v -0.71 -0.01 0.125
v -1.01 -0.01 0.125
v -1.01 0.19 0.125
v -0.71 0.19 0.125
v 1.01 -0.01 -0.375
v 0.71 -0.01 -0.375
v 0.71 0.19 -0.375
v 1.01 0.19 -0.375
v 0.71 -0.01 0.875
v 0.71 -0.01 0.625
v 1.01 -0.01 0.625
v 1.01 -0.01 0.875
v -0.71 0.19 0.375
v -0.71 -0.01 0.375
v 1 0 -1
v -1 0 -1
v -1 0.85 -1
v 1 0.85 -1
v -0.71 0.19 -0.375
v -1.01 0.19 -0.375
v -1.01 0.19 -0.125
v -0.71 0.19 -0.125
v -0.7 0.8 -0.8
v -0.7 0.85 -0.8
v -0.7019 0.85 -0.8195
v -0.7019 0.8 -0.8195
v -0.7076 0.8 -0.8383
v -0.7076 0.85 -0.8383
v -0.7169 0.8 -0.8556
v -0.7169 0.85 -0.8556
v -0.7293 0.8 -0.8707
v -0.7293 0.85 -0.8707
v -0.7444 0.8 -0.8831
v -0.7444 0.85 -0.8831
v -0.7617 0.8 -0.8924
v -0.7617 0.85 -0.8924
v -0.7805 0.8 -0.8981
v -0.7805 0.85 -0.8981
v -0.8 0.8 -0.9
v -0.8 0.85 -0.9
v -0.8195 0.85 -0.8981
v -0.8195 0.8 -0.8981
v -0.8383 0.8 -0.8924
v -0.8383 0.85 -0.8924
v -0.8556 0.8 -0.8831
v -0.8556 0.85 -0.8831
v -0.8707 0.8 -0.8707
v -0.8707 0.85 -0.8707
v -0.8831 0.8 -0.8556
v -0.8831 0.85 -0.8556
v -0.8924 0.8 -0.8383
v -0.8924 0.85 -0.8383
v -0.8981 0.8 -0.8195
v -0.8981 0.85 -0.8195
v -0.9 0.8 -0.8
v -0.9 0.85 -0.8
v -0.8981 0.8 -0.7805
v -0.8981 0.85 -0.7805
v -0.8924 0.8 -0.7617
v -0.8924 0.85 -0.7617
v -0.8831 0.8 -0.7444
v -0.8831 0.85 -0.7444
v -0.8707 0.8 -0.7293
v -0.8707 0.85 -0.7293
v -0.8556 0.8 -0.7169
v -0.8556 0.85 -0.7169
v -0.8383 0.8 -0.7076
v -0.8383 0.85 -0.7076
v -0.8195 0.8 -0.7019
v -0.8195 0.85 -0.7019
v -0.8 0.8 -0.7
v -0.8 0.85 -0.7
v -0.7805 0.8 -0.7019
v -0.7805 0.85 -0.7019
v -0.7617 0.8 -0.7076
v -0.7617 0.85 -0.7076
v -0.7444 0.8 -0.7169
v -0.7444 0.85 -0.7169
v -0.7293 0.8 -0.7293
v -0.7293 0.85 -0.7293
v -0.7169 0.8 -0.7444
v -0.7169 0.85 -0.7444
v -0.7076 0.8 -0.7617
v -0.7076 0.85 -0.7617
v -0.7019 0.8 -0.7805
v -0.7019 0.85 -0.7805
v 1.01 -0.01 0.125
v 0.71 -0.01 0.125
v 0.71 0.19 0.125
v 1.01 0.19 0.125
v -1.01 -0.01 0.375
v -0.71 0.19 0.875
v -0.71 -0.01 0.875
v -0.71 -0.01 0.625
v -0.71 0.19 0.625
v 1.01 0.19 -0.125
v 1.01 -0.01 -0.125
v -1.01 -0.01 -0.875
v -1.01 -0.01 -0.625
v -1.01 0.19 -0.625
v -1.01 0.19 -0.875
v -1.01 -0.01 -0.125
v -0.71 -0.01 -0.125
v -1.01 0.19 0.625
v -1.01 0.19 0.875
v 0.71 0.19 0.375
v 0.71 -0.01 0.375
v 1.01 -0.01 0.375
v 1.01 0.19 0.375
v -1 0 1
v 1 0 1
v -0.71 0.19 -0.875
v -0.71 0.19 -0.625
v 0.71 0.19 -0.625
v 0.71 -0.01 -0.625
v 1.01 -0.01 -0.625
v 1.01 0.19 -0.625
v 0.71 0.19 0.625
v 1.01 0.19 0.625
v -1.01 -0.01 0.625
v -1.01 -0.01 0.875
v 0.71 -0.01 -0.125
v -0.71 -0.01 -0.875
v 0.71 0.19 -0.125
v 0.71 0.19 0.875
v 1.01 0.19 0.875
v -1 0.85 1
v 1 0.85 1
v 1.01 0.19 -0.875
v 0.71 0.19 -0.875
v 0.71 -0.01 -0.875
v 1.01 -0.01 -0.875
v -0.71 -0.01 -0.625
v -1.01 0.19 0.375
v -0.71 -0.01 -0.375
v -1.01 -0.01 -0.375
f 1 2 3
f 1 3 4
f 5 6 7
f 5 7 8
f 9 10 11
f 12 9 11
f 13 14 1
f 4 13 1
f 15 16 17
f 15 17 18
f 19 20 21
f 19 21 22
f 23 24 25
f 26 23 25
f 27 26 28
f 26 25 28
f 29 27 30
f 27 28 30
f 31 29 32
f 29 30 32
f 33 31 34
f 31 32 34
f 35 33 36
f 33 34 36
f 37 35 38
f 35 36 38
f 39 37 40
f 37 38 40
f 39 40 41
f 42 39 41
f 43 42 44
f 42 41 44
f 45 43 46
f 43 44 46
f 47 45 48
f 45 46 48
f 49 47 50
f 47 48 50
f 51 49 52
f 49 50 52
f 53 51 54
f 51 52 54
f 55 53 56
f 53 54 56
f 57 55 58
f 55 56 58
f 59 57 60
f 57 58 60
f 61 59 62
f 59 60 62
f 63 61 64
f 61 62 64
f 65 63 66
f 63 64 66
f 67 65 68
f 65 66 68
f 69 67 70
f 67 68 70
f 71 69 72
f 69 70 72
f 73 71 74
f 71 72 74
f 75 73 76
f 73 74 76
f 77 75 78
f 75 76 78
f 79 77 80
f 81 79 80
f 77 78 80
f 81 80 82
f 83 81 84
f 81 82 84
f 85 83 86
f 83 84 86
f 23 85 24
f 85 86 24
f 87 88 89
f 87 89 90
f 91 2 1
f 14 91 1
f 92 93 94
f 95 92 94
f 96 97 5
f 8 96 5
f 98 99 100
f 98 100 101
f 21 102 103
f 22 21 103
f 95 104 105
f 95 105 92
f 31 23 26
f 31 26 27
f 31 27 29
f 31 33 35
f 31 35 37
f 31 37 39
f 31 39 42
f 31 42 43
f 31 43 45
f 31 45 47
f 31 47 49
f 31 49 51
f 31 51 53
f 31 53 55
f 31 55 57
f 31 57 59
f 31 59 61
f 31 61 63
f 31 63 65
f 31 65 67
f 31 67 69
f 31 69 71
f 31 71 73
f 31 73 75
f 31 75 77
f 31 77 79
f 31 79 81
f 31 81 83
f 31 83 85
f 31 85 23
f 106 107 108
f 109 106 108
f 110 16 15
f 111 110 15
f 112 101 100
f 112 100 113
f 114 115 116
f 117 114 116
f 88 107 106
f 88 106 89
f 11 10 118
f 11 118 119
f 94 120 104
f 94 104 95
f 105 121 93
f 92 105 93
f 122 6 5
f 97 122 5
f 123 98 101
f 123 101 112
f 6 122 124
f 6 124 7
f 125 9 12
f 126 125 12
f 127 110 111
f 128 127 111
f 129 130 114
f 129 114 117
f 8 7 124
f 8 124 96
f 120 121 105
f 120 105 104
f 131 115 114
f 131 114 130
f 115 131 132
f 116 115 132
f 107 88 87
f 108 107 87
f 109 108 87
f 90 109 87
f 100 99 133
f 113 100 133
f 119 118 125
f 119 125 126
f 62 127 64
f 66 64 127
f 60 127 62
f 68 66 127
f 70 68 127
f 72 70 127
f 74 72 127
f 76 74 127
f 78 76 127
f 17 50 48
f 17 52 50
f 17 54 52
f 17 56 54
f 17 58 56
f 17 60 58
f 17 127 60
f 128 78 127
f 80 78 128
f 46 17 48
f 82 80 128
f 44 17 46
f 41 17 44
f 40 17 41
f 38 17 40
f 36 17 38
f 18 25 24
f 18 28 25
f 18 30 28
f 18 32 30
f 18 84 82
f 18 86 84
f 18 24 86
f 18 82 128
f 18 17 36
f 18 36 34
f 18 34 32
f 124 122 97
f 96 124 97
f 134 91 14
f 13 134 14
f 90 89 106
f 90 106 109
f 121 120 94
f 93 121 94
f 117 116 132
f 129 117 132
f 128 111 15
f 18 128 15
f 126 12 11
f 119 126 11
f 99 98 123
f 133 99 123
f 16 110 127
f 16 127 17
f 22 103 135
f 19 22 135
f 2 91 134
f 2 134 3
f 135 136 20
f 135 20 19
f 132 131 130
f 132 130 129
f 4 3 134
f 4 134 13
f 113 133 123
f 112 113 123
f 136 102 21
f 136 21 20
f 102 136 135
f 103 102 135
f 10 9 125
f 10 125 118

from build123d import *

# Parameters (mm, degrees)
SKETCH1_W             = 2
SKETCH1_H             = 2
BOSS_EXTRUDE1_DEPTH   = 0.85
BOSS_EXTRUDE2_START   = -0.01
SKETCH2_W             = 0.3
SKETCH2_H             = 0.25
BOSS_EXTRUDE2_DEPTH   = 0.2
BOSS_EXTRUDE2_2_DEPTH = 0.2
BOSS_EXTRUDE2_3_DEPTH = 0.2
BOSS_EXTRUDE2_4_DEPTH = 0.2
BOSS_EXTRUDE2_5_DEPTH = 0.2
BOSS_EXTRUDE2_6_DEPTH = 0.2
BOSS_EXTRUDE2_7_DEPTH = 0.2
BOSS_EXTRUDE2_8_DEPTH = 0.2
SKETCH3_R             = 0.1
CUT_EXTRUDE1_DEPTH    = 0.05


with BuildPart() as part:
    # Sketch1 → Boss-Extrude1 (new body)
    with BuildSketch(Plane(origin=(0, 0, 0), x_dir=(1, 0, 0), z_dir=(0, 1, 0))):
        Rectangle(SKETCH1_W, SKETCH1_H)
    extrude(amount=BOSS_EXTRUDE1_DEPTH)

    # Sketch3 → Cut-Extrude1 (cut)
    with BuildSketch(Plane(origin=(0, 0.85, 0), x_dir=(1, 0, 0), z_dir=(0, 1, 0))):
        with Locations((-0.8, 0.8)):
            Circle(SKETCH3_R)
    extrude(amount=-CUT_EXTRUDE1_DEPTH, mode=Mode.SUBTRACT)


with BuildPart() as body_2:
    # Sketch2 → Boss-Extrude2 (new body)
    with BuildSketch(Plane(origin=(0, 0, 0), x_dir=(1, 0, 0), z_dir=(0, 1, 0)).offset(BOSS_EXTRUDE2_START)):
        with Locations((-0.86, 0.25)):
            Rectangle(SKETCH2_W, SKETCH2_H)
    extrude(amount=BOSS_EXTRUDE2_DEPTH)


with BuildPart() as body_3:
    # Sketch2 → Boss-Extrude2 2 (new body)
    with BuildSketch(Plane(origin=(0, 0, 0), x_dir=(1, 0, 0), z_dir=(0, 1, 0)).offset(BOSS_EXTRUDE2_START)):
        with Locations((-0.86, 0.75)):
            Rectangle(SKETCH2_W, SKETCH2_H)
    extrude(amount=BOSS_EXTRUDE2_2_DEPTH)


with BuildPart() as body_4:
    # Sketch2 → Boss-Extrude2 3 (new body)
    with BuildSketch(Plane(origin=(0, 0, 0), x_dir=(1, 0, 0), z_dir=(0, 1, 0)).offset(BOSS_EXTRUDE2_START)):
        with Locations((-0.86, -0.25)):
            Rectangle(SKETCH2_W, SKETCH2_H)
    extrude(amount=BOSS_EXTRUDE2_3_DEPTH)


with BuildPart() as body_5:
    # Sketch2 → Boss-Extrude2 4 (new body)
    with BuildSketch(Plane(origin=(0, 0, 0), x_dir=(1, 0, 0), z_dir=(0, 1, 0)).offset(BOSS_EXTRUDE2_START)):
        with Locations((-0.86, -0.75)):
            Rectangle(SKETCH2_W, SKETCH2_H)
    extrude(amount=BOSS_EXTRUDE2_4_DEPTH)


with BuildPart() as body_6:
    # Sketch2 → Boss-Extrude2 5 (new body)
    with BuildSketch(Plane(origin=(0, 0, 0), x_dir=(1, 0, 0), z_dir=(0, 1, 0)).offset(BOSS_EXTRUDE2_START)):
        with Locations((0.86, -0.75)):
            Rectangle(SKETCH2_W, SKETCH2_H)
    extrude(amount=BOSS_EXTRUDE2_5_DEPTH)


with BuildPart() as body_7:
    # Sketch2 → Boss-Extrude2 6 (new body)
    with BuildSketch(Plane(origin=(0, 0, 0), x_dir=(1, 0, 0), z_dir=(0, 1, 0)).offset(BOSS_EXTRUDE2_START)):
        with Locations((0.86, -0.25)):
            Rectangle(SKETCH2_W, SKETCH2_H)
    extrude(amount=BOSS_EXTRUDE2_6_DEPTH)


with BuildPart() as body_8:
    # Sketch2 → Boss-Extrude2 7 (new body)
    with BuildSketch(Plane(origin=(0, 0, 0), x_dir=(1, 0, 0), z_dir=(0, 1, 0)).offset(BOSS_EXTRUDE2_START)):
        with Locations((0.86, 0.75)):
            Rectangle(SKETCH2_W, SKETCH2_H)
    extrude(amount=BOSS_EXTRUDE2_7_DEPTH)


with BuildPart() as body_9:
    # Sketch2 → Boss-Extrude2 8 (new body)
    with BuildSketch(Plane(origin=(0, 0, 0), x_dir=(1, 0, 0), z_dir=(0, 1, 0)).offset(BOSS_EXTRUDE2_START)):
        with Locations((0.86, 0.25)):
            Rectangle(SKETCH2_W, SKETCH2_H)
    extrude(amount=BOSS_EXTRUDE2_8_DEPTH)


solid = Compound([part.part, body_2.part, body_3.part, body_4.part, body_5.part, body_6.part, body_7.part, body_8.part, body_9.part])
